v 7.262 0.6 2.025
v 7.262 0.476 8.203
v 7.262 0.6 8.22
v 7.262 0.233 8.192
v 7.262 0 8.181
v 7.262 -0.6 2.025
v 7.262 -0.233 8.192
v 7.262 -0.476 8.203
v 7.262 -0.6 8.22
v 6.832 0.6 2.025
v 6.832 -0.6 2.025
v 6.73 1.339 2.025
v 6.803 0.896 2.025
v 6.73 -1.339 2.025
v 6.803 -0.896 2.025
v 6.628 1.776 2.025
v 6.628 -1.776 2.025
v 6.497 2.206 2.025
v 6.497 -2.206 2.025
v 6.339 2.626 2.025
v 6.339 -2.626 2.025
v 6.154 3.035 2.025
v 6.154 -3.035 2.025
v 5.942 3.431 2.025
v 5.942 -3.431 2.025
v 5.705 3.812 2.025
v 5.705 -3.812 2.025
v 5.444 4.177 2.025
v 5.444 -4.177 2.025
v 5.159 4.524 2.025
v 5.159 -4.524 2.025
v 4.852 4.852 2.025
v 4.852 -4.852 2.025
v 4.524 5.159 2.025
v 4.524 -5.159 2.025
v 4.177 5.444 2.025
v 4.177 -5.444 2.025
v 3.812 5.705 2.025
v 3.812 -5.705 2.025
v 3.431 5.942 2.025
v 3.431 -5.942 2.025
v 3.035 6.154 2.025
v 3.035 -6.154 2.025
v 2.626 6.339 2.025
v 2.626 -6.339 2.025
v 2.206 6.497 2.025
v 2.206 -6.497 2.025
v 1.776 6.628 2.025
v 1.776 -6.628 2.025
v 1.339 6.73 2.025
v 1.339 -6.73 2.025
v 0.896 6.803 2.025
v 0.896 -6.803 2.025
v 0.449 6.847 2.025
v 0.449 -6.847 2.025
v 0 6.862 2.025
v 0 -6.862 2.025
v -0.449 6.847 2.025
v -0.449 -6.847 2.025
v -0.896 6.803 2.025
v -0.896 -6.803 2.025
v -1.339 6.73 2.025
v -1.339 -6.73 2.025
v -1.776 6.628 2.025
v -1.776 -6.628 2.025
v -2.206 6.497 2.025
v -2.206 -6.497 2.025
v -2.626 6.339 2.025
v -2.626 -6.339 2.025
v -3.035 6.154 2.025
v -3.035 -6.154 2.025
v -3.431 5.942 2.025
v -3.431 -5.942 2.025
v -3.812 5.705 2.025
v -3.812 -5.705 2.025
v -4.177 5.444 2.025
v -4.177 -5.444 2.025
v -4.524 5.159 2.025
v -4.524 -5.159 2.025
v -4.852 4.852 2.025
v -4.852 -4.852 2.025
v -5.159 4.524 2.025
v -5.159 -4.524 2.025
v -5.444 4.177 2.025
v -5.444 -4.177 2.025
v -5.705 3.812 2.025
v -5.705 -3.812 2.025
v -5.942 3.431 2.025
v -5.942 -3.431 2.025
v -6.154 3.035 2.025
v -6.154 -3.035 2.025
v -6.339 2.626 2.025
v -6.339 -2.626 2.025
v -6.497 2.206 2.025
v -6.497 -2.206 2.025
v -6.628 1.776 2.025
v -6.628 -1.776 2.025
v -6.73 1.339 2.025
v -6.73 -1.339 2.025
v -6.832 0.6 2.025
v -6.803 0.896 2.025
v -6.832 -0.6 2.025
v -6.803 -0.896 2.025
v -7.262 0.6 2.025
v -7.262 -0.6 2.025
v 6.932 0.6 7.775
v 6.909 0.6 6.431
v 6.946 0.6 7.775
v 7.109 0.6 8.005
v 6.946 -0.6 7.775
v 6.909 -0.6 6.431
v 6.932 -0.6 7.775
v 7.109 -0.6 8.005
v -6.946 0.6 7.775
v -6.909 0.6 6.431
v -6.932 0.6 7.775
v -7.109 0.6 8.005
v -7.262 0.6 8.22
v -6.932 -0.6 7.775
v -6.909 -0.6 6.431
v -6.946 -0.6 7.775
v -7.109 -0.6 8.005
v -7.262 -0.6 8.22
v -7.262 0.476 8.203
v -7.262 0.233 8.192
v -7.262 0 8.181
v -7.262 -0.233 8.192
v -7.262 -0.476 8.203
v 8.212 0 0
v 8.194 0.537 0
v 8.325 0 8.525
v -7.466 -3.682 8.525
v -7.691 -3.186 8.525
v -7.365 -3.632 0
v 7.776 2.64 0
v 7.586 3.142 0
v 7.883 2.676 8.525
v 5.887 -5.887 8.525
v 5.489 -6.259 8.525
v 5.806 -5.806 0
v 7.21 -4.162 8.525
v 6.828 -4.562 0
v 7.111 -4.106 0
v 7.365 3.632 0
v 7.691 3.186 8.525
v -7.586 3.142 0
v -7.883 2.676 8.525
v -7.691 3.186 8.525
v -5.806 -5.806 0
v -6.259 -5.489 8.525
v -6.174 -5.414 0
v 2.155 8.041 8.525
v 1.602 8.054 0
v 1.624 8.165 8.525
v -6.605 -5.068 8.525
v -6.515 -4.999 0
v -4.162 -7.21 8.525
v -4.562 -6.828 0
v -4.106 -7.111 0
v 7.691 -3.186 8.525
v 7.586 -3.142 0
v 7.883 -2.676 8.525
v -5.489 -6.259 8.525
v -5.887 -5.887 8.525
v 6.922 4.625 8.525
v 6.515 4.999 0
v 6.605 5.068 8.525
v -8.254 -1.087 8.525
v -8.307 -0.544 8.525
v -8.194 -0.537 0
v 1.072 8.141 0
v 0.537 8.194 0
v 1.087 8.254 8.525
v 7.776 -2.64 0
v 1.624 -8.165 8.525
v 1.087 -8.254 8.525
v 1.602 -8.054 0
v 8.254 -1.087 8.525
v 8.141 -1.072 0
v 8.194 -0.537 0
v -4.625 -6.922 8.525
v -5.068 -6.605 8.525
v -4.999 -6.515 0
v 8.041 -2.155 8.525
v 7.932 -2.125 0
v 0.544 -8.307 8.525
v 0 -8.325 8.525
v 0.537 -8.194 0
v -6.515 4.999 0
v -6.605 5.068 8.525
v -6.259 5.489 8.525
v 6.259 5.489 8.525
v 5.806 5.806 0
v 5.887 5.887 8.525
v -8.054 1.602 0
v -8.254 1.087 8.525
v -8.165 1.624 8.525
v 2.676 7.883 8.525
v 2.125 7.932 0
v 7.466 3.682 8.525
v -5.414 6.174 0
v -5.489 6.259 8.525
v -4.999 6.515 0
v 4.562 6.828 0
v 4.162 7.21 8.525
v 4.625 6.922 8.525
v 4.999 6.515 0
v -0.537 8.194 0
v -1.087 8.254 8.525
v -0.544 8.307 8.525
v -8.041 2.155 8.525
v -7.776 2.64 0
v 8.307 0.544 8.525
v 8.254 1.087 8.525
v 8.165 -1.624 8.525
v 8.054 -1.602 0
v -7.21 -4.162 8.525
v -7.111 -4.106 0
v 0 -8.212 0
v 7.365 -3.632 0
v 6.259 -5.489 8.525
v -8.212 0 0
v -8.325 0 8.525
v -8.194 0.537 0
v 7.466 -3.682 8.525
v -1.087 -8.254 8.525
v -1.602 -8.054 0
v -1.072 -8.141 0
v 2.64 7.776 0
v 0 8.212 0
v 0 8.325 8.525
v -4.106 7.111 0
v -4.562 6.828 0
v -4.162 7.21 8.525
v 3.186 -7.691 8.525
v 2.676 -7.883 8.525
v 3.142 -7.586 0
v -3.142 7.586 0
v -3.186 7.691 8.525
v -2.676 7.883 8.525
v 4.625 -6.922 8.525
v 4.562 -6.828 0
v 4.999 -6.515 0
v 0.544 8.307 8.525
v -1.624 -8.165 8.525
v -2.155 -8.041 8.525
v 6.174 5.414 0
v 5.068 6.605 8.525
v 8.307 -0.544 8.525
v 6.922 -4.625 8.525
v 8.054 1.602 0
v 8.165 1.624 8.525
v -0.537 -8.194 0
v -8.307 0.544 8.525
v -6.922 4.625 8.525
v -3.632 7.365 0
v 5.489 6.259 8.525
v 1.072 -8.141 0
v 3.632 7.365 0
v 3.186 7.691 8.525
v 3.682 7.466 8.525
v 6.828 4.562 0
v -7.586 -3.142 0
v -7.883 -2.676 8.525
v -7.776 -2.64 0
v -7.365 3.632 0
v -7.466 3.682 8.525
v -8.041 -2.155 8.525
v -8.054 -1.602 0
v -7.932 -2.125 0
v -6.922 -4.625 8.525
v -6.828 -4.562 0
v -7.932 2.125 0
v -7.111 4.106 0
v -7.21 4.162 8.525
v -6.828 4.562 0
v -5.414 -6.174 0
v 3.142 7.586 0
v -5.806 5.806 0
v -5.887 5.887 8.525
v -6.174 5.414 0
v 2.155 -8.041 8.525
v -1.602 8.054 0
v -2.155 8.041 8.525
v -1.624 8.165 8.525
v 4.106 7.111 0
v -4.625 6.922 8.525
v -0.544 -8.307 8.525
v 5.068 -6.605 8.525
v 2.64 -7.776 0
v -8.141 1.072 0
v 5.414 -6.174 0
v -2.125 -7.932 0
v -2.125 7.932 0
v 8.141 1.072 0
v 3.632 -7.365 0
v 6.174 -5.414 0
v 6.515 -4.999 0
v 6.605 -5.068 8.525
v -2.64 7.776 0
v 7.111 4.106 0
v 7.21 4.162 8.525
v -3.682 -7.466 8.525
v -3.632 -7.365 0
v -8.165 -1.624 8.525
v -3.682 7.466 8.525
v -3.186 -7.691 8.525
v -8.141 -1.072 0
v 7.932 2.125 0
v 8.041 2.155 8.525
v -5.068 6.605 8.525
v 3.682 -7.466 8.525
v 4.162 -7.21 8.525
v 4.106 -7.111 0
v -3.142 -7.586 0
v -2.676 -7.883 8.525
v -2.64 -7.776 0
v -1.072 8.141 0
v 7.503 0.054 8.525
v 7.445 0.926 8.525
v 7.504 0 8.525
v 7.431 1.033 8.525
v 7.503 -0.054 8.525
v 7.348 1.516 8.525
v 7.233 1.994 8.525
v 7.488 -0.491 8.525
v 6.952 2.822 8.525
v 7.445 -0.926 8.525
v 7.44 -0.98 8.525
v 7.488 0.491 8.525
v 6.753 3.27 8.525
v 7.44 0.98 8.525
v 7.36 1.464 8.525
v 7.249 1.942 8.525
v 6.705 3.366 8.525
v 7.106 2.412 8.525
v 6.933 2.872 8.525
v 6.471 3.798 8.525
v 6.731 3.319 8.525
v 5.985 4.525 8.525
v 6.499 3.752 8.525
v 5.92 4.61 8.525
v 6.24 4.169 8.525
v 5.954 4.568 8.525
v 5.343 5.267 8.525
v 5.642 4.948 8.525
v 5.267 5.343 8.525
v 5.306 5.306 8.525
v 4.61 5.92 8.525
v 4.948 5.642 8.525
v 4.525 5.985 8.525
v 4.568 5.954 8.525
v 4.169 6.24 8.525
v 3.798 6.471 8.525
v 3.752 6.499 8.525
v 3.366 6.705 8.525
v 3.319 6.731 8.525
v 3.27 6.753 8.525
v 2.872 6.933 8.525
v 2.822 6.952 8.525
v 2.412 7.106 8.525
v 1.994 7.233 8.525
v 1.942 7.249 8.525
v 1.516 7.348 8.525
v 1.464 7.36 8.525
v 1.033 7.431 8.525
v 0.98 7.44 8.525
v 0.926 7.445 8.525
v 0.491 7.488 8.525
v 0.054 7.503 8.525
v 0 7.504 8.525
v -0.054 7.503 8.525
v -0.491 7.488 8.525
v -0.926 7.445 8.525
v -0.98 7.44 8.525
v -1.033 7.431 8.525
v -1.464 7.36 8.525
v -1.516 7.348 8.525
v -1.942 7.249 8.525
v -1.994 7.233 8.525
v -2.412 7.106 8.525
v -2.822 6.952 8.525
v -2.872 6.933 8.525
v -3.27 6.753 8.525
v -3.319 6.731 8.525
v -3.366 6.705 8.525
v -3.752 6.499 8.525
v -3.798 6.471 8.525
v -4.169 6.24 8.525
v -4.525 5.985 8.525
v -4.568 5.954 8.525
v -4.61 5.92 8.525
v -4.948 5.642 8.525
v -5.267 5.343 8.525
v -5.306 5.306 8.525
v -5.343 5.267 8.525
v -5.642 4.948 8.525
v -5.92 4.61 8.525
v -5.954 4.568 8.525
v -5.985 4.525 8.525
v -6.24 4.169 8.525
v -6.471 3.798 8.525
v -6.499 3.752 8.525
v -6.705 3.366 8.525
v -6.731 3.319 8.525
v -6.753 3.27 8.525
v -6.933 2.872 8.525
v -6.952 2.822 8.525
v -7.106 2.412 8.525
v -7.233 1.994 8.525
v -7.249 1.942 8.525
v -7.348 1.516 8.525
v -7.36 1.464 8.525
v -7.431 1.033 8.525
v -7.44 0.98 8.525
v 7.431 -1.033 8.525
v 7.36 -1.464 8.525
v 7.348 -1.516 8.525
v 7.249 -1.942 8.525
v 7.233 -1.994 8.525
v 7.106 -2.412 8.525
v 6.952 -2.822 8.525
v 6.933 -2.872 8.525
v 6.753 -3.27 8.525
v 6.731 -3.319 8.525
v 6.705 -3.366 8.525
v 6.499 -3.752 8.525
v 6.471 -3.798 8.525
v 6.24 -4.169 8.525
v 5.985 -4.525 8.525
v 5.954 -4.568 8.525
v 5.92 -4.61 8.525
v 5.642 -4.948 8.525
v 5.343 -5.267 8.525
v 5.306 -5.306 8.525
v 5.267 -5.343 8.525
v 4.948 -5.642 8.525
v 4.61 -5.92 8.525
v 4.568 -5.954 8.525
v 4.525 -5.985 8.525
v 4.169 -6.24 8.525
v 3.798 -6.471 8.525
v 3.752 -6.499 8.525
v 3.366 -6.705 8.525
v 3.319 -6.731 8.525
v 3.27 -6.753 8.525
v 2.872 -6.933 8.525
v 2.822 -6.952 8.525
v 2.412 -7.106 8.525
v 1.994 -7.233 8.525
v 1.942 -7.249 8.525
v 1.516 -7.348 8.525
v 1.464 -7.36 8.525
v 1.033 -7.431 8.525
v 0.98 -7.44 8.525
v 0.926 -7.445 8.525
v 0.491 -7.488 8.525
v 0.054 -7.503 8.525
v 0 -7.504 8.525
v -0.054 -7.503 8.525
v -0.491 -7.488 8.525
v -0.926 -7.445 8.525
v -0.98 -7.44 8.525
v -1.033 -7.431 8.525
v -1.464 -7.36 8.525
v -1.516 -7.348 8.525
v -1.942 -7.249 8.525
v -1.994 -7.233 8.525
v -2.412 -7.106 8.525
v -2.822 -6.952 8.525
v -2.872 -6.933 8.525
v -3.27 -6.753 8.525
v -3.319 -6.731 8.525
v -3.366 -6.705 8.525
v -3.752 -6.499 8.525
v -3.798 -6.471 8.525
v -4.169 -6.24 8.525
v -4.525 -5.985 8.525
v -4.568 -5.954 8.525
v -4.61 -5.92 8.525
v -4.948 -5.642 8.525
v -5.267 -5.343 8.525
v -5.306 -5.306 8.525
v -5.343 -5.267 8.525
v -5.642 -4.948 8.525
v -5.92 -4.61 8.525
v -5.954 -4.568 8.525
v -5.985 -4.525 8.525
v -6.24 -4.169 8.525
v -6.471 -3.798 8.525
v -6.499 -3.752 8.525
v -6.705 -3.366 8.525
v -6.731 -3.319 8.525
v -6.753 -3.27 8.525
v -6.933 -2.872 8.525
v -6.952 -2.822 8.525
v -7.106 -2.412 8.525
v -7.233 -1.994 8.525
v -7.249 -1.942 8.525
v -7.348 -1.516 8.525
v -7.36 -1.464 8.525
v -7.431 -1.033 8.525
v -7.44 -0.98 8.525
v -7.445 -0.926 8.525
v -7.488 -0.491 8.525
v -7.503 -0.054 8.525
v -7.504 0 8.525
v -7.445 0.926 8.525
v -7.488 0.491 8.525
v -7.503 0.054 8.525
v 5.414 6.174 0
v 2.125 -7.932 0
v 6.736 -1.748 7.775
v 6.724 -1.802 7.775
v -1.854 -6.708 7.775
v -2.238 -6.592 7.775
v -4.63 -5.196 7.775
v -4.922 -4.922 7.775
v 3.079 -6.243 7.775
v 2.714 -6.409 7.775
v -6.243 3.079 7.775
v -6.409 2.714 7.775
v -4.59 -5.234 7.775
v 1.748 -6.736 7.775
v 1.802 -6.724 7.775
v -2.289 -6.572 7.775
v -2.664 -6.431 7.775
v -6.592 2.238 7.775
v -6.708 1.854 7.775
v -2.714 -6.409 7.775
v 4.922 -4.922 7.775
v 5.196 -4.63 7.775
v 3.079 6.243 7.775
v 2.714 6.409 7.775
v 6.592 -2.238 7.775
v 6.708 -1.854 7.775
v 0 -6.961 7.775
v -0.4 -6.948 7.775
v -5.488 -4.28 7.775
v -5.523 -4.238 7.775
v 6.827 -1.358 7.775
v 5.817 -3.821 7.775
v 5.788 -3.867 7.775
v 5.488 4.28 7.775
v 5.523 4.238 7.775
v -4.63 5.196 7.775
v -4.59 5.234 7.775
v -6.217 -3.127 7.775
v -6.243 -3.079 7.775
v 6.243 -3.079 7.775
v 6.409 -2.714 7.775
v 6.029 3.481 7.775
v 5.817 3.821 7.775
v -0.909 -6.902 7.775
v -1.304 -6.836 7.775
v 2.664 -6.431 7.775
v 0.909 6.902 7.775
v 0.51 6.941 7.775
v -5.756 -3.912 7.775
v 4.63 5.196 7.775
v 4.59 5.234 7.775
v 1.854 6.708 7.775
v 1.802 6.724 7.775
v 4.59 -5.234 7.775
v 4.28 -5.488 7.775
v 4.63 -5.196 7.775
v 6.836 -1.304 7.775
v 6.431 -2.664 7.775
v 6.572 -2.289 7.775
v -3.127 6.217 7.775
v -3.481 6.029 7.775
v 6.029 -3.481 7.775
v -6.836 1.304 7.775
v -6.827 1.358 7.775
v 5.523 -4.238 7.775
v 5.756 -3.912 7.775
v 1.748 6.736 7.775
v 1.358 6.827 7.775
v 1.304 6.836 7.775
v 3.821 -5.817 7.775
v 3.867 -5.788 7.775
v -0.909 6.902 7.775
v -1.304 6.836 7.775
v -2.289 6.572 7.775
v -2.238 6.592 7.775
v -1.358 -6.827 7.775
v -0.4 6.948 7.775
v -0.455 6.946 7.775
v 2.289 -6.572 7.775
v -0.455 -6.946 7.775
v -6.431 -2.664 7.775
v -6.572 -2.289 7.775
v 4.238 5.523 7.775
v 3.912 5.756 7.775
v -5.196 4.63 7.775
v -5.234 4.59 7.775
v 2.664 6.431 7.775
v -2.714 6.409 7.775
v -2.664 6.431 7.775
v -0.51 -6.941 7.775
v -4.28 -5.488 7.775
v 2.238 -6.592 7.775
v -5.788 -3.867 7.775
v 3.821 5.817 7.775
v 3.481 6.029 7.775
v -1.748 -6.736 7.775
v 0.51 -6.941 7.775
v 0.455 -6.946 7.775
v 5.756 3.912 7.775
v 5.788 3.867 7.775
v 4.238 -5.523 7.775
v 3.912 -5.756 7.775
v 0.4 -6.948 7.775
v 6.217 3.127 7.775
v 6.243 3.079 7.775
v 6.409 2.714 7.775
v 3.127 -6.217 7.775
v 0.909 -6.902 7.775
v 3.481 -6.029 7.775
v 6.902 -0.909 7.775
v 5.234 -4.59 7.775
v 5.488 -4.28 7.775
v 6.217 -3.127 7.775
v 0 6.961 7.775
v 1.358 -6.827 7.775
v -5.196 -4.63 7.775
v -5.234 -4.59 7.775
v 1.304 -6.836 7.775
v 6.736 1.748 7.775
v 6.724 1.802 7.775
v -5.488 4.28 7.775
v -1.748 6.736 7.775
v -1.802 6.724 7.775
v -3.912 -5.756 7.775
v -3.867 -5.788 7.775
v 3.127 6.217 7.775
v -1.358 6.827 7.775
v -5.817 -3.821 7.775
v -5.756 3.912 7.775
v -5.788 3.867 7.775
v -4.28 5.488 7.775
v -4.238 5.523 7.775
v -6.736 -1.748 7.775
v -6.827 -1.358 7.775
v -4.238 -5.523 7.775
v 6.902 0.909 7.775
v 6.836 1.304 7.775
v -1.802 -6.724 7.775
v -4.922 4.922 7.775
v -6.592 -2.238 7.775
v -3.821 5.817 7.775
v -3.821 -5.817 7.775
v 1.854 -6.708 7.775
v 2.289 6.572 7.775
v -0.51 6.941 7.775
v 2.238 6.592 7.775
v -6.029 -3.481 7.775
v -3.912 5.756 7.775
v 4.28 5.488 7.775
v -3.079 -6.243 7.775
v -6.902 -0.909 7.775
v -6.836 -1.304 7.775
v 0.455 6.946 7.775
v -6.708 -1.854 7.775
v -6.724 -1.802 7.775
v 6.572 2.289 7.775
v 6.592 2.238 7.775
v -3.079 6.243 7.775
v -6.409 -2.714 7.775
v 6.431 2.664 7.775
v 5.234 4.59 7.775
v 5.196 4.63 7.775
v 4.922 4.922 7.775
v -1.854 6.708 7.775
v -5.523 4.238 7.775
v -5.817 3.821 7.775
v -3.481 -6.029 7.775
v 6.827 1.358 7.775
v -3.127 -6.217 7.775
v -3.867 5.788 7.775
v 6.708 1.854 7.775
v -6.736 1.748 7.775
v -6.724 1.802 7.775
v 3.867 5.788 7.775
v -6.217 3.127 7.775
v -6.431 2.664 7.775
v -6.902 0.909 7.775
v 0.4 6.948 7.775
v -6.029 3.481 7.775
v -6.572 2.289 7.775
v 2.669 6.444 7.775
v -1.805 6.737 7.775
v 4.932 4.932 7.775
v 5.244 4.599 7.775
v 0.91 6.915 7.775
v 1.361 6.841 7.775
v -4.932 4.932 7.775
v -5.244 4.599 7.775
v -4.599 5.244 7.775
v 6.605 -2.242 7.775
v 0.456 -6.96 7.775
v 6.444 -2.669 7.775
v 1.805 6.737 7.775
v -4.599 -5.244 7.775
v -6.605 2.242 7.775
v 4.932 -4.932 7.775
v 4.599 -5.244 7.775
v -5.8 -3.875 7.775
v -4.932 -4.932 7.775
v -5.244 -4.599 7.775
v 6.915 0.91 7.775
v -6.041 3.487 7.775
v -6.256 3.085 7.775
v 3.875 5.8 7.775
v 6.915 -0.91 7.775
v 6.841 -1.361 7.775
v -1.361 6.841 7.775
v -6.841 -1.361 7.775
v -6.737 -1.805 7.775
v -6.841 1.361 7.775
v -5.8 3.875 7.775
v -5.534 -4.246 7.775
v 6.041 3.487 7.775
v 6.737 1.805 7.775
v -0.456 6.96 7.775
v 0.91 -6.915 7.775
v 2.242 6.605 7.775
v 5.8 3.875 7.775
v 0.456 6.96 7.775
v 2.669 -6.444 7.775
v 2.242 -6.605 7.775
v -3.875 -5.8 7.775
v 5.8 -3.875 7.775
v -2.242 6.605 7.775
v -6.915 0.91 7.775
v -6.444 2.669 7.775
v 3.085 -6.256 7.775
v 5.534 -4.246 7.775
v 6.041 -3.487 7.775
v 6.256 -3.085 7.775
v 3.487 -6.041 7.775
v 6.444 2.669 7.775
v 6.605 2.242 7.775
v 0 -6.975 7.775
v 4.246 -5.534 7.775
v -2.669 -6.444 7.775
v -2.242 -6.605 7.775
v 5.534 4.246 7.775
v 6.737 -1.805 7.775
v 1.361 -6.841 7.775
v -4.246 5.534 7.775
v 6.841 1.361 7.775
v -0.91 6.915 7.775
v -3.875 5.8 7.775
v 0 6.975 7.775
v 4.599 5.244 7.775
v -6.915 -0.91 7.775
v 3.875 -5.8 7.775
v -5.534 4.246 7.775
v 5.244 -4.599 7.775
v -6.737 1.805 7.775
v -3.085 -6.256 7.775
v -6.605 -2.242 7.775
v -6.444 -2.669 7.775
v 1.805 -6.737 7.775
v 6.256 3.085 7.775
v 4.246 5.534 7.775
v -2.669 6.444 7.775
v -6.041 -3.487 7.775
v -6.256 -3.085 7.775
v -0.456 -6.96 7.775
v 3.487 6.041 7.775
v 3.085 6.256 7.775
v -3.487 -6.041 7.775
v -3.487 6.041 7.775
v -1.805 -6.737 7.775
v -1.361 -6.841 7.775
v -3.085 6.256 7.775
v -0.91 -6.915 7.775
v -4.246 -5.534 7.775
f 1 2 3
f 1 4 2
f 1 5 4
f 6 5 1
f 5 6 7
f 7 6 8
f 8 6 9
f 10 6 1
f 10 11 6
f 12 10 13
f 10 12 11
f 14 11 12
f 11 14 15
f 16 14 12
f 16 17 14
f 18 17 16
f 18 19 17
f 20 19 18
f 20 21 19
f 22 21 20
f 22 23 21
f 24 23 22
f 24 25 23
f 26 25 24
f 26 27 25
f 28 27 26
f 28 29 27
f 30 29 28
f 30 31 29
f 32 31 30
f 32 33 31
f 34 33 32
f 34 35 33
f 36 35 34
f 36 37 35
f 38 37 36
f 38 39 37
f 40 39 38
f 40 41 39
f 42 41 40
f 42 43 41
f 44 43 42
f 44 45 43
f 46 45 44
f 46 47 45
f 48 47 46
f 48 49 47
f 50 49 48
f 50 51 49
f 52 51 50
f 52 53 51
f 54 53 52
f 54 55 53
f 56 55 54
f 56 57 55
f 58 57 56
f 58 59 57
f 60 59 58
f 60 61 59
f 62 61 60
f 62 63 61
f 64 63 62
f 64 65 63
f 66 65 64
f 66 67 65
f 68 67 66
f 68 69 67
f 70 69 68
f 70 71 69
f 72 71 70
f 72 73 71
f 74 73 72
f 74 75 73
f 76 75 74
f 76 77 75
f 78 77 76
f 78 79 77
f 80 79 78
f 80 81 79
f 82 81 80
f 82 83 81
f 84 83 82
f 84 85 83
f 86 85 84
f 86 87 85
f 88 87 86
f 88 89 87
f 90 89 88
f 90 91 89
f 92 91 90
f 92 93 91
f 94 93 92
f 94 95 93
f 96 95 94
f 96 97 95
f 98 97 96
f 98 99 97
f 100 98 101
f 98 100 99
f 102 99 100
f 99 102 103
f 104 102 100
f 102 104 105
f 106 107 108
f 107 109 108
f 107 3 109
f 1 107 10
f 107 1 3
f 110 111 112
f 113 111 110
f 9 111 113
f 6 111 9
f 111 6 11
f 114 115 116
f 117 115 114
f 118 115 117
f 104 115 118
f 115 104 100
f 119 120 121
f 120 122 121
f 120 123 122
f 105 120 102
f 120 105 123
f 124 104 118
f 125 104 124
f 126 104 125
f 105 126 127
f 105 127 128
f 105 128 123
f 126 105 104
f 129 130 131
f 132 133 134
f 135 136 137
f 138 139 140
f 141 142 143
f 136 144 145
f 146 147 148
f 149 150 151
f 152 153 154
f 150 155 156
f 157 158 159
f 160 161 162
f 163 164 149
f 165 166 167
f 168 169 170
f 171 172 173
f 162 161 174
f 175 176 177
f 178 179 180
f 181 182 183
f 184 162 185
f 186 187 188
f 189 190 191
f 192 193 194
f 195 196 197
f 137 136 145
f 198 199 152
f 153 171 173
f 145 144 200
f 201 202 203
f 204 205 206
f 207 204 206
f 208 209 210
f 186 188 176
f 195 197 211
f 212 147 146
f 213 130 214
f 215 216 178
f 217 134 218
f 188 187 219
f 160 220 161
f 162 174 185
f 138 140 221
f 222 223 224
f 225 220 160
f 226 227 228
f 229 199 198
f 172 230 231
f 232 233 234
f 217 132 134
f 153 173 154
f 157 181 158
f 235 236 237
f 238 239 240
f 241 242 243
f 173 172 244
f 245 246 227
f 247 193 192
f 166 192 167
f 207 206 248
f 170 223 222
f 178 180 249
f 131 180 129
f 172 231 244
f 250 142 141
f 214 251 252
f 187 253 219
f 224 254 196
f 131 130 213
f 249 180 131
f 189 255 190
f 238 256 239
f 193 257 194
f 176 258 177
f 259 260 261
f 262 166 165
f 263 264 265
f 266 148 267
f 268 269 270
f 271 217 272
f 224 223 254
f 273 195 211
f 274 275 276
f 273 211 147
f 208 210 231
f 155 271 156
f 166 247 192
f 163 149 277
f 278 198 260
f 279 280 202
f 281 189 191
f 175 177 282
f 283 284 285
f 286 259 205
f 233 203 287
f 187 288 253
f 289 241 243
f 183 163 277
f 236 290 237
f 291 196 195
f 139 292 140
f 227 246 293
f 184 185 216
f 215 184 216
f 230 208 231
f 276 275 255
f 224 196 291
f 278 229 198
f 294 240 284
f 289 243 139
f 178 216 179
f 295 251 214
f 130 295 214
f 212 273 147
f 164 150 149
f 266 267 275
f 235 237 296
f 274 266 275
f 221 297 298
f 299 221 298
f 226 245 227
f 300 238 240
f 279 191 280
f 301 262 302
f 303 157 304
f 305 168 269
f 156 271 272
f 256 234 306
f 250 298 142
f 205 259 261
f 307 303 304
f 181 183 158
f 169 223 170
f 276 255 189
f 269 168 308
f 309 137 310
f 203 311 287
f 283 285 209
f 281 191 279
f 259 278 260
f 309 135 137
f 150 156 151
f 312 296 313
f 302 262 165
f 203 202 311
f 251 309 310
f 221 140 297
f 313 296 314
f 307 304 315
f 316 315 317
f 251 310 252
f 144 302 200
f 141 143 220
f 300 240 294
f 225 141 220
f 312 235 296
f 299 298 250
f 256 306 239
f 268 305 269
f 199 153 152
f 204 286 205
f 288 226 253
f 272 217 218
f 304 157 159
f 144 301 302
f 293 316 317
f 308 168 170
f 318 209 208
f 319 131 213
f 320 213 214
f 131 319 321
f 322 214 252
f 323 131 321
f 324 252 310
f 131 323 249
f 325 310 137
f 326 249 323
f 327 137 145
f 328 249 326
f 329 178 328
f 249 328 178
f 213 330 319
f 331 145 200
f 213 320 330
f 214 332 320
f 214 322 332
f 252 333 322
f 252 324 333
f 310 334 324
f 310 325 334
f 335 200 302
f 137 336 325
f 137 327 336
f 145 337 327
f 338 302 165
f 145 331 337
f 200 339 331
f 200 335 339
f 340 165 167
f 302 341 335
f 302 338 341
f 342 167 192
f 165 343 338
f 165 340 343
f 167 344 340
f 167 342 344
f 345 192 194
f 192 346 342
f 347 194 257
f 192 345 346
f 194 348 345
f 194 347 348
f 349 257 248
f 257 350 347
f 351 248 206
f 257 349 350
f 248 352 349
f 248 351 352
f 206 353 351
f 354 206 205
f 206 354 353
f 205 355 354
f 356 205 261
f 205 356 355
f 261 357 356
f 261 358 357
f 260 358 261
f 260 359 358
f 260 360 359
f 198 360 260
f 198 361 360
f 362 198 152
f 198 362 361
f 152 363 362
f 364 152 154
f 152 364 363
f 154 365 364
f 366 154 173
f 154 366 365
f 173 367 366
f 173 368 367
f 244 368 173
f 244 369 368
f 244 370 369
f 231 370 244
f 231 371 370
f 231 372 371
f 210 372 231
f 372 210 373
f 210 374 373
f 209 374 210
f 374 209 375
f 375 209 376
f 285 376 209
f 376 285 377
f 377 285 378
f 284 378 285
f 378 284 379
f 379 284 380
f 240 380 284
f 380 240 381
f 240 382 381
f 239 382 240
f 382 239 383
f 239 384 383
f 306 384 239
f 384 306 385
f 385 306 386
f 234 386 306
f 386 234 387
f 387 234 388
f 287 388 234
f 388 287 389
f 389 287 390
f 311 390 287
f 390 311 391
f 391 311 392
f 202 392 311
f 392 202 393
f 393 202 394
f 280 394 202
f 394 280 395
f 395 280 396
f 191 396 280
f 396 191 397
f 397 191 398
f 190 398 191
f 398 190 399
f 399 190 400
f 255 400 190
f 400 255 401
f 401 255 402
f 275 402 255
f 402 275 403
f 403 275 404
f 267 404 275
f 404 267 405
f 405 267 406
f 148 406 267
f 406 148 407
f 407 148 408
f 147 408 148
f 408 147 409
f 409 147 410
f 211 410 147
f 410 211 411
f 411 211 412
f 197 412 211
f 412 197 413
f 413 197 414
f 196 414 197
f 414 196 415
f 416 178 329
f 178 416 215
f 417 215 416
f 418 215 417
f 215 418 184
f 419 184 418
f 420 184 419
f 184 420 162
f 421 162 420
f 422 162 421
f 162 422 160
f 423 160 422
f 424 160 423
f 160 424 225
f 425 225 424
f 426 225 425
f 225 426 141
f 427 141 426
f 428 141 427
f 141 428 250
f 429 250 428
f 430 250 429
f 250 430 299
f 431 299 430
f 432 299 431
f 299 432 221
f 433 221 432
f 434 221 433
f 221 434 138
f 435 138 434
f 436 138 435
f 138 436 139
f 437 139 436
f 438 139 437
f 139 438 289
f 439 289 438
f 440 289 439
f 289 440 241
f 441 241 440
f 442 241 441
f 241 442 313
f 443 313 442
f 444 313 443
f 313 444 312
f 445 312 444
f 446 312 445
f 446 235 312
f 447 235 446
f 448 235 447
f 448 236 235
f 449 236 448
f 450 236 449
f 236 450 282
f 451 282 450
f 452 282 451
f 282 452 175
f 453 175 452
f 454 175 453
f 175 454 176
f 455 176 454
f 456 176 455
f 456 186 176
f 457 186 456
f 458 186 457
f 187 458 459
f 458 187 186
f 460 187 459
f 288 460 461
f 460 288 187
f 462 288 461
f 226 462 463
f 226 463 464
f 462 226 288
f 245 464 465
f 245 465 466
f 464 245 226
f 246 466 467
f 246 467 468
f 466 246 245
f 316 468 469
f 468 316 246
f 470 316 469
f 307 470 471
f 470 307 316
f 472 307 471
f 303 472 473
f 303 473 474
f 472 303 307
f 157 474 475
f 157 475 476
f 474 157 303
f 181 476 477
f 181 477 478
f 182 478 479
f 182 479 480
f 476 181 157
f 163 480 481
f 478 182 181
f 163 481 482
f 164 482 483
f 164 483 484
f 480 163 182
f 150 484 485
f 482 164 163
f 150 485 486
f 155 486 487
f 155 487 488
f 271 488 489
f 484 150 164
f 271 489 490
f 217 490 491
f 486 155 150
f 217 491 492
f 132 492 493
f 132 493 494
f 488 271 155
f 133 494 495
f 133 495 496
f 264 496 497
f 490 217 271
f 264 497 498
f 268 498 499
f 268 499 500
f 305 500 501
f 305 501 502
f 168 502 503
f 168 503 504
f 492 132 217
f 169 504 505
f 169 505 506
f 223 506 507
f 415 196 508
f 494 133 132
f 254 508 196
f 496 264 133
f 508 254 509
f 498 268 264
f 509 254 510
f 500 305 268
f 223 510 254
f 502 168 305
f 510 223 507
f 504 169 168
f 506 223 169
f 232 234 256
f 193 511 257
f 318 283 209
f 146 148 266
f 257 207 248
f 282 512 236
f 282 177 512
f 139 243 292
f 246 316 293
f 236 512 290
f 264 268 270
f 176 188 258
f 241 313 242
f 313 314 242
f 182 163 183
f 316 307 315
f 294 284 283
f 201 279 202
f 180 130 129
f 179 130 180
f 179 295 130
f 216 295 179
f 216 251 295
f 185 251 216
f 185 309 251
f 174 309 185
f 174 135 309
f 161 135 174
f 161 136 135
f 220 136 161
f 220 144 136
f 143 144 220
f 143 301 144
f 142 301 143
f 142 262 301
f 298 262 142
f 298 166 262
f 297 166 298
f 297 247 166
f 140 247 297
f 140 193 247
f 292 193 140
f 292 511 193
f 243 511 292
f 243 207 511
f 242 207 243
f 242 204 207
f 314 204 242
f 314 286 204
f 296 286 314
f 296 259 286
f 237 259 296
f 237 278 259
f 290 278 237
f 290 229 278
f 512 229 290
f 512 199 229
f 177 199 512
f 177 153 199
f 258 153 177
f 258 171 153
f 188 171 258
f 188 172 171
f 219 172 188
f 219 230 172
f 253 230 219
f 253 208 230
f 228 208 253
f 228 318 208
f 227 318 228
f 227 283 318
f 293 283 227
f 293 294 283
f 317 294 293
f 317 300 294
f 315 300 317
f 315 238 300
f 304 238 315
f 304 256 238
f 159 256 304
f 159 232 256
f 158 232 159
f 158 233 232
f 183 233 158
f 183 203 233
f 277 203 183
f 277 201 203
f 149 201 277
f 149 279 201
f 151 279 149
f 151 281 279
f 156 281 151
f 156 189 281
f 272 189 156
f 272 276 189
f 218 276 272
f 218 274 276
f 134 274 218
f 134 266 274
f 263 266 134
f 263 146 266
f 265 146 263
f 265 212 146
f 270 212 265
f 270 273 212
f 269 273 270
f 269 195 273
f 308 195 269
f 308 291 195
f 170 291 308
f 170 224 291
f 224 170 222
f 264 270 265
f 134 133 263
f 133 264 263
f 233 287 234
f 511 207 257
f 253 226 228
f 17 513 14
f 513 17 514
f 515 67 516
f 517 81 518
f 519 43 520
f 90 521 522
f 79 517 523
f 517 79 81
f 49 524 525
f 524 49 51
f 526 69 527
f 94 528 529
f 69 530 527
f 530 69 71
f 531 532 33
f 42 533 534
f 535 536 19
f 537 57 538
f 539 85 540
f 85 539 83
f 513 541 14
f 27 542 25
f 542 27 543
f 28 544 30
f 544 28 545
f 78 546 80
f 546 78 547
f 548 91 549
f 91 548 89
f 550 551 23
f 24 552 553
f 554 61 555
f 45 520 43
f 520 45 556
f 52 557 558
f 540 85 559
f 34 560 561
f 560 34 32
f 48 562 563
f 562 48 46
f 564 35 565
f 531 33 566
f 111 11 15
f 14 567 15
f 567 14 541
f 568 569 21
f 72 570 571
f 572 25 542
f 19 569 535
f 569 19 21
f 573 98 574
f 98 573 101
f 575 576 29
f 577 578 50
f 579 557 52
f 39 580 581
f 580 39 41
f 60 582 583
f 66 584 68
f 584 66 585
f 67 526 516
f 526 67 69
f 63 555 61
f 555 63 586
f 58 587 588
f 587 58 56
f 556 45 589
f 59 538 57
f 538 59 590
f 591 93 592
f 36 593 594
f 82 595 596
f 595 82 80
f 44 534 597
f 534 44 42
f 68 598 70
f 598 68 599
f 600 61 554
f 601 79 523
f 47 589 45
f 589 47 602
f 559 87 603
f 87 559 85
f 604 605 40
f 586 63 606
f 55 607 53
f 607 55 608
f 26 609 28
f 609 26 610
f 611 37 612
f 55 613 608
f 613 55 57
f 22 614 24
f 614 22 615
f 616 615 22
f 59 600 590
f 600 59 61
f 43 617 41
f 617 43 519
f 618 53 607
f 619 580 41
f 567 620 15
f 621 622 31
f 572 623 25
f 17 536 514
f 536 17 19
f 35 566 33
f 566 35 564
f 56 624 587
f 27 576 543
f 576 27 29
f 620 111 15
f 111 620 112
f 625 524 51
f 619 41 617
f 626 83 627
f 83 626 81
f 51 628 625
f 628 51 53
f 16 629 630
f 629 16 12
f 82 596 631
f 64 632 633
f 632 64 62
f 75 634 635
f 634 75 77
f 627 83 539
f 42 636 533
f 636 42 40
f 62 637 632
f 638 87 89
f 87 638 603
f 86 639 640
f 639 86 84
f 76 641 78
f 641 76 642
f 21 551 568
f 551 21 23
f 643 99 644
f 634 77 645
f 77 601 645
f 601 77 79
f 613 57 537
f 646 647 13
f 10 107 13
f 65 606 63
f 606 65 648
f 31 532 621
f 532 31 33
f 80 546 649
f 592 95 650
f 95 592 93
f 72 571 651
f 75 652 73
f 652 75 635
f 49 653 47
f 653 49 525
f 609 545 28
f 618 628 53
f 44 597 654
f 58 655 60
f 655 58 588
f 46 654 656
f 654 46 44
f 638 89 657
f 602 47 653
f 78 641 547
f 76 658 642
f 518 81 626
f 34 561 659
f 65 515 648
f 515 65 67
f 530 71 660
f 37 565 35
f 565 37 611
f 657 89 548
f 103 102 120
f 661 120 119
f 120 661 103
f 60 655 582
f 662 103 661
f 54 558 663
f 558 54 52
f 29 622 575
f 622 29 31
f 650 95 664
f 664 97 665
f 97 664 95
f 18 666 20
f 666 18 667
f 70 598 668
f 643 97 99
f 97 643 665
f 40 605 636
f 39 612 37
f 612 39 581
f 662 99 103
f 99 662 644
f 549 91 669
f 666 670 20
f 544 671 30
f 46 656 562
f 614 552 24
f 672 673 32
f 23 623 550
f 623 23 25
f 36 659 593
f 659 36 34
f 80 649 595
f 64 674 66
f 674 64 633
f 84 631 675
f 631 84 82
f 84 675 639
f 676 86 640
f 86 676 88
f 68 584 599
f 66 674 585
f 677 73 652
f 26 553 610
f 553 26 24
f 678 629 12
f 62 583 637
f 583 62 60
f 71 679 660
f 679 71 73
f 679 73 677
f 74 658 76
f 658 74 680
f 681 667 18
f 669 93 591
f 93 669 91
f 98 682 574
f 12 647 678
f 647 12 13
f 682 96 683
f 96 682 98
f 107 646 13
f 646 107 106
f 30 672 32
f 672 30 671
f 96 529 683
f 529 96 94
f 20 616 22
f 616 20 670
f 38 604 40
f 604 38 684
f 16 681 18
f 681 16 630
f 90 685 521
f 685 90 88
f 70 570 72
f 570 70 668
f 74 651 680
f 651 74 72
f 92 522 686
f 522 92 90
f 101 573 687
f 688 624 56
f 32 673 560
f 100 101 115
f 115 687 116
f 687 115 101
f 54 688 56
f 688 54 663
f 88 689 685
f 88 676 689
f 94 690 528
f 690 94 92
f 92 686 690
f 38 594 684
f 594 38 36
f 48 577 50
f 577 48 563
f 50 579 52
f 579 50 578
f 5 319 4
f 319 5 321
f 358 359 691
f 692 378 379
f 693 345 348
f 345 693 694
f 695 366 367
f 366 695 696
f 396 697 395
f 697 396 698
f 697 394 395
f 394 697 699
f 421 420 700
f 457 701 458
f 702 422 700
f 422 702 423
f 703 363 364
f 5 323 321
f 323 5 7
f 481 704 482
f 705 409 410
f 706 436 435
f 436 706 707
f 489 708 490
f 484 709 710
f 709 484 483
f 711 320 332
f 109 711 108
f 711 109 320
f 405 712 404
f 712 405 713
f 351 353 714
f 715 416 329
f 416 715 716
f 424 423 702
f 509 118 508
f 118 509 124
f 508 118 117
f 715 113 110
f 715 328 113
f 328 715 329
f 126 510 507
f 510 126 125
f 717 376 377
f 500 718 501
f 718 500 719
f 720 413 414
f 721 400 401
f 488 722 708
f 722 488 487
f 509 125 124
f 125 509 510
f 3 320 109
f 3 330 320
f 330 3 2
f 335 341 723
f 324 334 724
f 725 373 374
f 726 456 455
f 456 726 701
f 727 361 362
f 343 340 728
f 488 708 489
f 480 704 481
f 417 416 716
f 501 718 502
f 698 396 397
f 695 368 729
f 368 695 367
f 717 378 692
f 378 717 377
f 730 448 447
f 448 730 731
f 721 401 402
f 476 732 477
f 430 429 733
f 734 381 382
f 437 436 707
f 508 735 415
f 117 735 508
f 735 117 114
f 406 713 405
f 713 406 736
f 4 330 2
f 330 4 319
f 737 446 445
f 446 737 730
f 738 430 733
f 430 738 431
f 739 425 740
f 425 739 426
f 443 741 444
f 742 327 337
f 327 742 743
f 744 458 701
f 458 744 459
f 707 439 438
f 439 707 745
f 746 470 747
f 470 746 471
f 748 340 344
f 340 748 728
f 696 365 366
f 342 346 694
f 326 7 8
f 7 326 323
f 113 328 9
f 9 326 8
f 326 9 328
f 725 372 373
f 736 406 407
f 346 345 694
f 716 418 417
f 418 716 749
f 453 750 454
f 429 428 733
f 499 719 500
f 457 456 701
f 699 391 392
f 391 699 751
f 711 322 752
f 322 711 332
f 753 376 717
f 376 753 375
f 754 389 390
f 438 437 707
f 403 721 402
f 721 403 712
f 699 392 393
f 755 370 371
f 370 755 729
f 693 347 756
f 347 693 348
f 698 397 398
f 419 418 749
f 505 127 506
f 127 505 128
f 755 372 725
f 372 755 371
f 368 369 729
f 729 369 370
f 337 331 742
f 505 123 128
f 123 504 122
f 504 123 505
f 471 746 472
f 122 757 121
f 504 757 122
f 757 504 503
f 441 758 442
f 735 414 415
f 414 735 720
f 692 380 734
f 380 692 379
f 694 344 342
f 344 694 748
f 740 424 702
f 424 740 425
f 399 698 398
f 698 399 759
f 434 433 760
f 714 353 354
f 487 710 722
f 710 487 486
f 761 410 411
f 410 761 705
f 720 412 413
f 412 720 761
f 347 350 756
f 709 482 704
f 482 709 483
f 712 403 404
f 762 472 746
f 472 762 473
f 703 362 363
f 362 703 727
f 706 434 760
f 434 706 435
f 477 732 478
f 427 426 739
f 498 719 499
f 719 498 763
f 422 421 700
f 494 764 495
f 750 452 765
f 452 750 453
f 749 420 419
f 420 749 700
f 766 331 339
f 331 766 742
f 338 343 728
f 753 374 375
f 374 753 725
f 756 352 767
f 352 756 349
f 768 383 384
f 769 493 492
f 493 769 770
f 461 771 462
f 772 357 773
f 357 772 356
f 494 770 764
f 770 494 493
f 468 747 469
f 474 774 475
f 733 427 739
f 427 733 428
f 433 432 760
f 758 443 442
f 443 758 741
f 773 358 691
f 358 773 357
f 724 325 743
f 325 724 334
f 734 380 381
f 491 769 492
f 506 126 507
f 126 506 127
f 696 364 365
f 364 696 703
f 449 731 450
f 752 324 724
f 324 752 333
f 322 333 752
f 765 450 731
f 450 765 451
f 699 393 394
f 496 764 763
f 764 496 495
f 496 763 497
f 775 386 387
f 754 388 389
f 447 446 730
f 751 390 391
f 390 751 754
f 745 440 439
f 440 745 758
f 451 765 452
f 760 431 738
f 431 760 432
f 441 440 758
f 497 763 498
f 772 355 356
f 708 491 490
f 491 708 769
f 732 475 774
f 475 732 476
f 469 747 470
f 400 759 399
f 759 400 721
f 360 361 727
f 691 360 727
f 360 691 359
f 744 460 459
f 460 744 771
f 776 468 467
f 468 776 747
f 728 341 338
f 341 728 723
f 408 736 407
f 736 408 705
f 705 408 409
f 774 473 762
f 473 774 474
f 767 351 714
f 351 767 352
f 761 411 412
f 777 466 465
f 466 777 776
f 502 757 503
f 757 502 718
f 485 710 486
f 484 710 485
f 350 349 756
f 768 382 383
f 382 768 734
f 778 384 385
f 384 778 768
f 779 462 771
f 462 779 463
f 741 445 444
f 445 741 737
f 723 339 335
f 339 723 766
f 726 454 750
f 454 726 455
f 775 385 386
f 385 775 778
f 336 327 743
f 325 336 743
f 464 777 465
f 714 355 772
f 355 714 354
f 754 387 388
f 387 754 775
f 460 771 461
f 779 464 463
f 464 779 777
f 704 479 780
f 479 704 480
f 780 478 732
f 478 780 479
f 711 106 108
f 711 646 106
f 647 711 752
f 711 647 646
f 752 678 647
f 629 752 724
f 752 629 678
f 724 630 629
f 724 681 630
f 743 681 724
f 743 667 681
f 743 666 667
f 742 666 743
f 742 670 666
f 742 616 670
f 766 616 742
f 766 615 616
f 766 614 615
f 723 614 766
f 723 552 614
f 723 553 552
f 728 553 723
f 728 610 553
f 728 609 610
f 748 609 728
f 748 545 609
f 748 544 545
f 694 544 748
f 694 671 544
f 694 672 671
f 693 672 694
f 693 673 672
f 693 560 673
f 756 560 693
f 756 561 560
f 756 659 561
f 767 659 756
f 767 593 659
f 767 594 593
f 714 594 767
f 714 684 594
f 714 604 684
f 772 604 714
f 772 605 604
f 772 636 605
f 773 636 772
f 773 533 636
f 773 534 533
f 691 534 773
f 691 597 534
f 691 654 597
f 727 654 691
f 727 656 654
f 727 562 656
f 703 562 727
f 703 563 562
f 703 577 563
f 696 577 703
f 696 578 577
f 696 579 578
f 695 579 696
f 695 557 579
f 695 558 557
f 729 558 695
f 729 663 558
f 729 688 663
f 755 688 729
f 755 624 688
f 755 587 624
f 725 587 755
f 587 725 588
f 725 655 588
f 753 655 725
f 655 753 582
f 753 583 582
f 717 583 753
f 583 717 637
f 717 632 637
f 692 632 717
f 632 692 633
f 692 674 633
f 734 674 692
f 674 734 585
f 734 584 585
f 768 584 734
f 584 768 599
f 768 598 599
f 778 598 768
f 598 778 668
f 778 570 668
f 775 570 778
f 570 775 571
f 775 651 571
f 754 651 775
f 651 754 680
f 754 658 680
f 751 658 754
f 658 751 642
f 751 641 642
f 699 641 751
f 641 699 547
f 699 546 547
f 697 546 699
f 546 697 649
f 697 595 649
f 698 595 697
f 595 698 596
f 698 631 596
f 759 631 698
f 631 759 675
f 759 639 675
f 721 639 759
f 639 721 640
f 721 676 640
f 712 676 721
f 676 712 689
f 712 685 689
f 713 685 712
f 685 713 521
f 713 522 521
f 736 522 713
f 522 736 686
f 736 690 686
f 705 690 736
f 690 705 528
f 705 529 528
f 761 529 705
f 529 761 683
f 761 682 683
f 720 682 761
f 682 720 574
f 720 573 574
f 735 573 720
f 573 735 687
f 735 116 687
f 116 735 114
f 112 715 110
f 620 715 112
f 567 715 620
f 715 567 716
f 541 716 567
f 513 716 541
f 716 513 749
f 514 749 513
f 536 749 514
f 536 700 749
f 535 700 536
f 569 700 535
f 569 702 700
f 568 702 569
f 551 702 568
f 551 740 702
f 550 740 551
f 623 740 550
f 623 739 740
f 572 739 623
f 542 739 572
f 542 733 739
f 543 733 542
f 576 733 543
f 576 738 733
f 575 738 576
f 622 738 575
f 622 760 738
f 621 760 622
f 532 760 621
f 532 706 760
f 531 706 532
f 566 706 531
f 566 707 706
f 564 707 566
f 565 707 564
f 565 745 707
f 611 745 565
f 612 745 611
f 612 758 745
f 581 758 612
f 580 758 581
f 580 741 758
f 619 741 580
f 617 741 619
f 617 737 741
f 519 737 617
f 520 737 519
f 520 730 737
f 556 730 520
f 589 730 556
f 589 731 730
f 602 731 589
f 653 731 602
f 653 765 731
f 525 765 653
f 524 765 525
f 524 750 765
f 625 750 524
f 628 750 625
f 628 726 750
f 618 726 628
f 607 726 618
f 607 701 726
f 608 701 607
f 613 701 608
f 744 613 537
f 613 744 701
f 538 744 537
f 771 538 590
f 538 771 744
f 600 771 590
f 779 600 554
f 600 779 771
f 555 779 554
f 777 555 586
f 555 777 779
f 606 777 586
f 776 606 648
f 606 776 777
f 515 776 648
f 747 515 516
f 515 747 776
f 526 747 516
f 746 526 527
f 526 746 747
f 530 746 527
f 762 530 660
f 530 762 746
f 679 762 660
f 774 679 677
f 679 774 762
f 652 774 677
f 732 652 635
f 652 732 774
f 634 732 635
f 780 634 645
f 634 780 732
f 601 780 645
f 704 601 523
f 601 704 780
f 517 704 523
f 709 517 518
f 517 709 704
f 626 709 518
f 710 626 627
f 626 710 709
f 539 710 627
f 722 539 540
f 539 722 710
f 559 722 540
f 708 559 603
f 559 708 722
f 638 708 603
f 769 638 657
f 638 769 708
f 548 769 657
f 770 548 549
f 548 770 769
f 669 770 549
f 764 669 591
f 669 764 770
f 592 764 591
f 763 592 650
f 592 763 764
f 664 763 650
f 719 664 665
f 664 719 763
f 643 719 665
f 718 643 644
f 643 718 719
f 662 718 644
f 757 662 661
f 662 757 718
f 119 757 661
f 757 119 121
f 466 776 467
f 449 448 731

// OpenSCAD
// =============================================================================
// PROJECT: PARAMETRIC TPU FPV CAMERA LENS CAP
// LICENSE: Creative Commons Zero (CC0) / Public Domain
// DESCRIPTION: Flexible lens protector for micro/nano FPV cameras (RunCam, 
//              Caddx, DJI O3, Walksnail, Foxeer). Optimized for TPU perimeters.
//              Oriented with cavity facing upward for clean, support-free prints.
// =============================================================================

/* [Camera Lens Dimensions] */
// Outer diameter of the lens barrel at its widest point (in mm)
lens_diameter       = 14.0; // [8.0:0.1:25.0]

// Depth/height of the lens barrel to cover (in mm)
lens_depth          = 6.5;  // [3.0:0.1:20.0]

// Fit adjustment: 0.0 for exact, negative for stretch-fit (TPU stretches ~0.1 - 0.2mm)
fit_tolerance       = -0.05; 

/* [Slicer & Wall Multipliers] */
// Printer nozzle diameter in mm
nozzle_diameter     = 0.6;  // [0.2, 0.4, 0.6, 0.8]

// Wall thickness as an exact integer count of nozzle extrusion passes
wall_perimeters     = 2;    // [1:1:6]

// Base cap thickness as an exact integer count of nozzle extrusion passes
cap_perimeters      = 3;    // [2:1:8]

// Layer height for print slices (in mm)
layer_height        = 0.24; // [0.12, 0.16, 0.20, 0.24, 0.28, 0.3]

/* [Features & Usability] */
// Add an internal air-relief / anti-suction notch
add_air_relief_vent = true;

// Slight internal taper angle (degrees) to wedge snugly without slipping off
taper_angle         = 1.0; 

/* [Hidden Calculations] */
$fn = 96;
overlap = 0.05;

// Extrusion math: standard slicers extrude lines ~1.125x nozzle diameter
extrusion_width   = nozzle_diameter * 1.125;
wall_thickness    = extrusion_width * wall_perimeters;
cap_thickness     = max(extrusion_width * cap_perimeters, layer_height * 4);

// Target internal bore dimensions
// Top mouth is wide; bottom floor is slightly tapered for snug retention
bore_top_dia      = lens_diameter + fit_tolerance;
bore_top_radius   = bore_top_dia / 2;

taper_delta       = lens_depth * tan(taper_angle);
bore_bottom_radius = max(bore_top_radius - taper_delta, bore_top_radius * 0.95);

// Outer dimensions (matching taper from base to rim)
outer_bottom_radius = bore_bottom_radius + wall_thickness;
outer_top_radius    = bore_top_radius + wall_thickness;
total_height        = lens_depth + cap_thickness;

// =============================================================================
// CONSOLE READOUT
// =============================================================================
echo("=== TPU LENS CAP SPECIFICATIONS ===");
echo(STR_BORE_DIAMETER     = bore_top_dia, "mm");
echo(STR_WALL_THICKNESS    = wall_thickness, "mm (", wall_perimeters, "perimeters )");
echo(STR_CAP_BASE_THICK    = cap_thickness, "mm");
echo(STR_TOTAL_HEIGHT      = total_height, "mm");
echo("===================================");

// =============================================================================
// MAIN ASSEMBLY
// =============================================================================
render_lens_cap();

module render_lens_cap() {
    difference() {
        // 1. SOLID POSITIVE BODY (Flat closed end resting on build plate at Z=0)
        cylinder(h = total_height, r1 = outer_bottom_radius, r2 = outer_top_radius);

        // 2. INTERNAL LENS CAVITY (Bore open to the top)
        translate([0, 0, cap_thickness])
            cylinder(h = lens_depth + overlap, r1 = bore_bottom_radius, r2 = bore_top_radius);

        // 3. INTERNAL AIR RELIEF GROOVES (Prevents vacuum lock during removal)
        if (add_air_relief_vent) {
            for (angle = [0, 180]) {
                rotate([0, 0, angle])
                    translate([bore_bottom_radius - 0.4, -0.6, cap_thickness])
                        cube([0.8, 1.2, lens_depth + overlap]);
            }
        }

        // 4. ENTRANCE LEAD-IN CHAMFER (At the top mouth for easy push-on fit)
        translate([0, 0, total_height - 0.8 + overlap])
            cylinder(h = 0.8 + overlap, r1 = bore_top_radius, r2 = bore_top_radius + 0.6, $fn = 96);
    }
}
